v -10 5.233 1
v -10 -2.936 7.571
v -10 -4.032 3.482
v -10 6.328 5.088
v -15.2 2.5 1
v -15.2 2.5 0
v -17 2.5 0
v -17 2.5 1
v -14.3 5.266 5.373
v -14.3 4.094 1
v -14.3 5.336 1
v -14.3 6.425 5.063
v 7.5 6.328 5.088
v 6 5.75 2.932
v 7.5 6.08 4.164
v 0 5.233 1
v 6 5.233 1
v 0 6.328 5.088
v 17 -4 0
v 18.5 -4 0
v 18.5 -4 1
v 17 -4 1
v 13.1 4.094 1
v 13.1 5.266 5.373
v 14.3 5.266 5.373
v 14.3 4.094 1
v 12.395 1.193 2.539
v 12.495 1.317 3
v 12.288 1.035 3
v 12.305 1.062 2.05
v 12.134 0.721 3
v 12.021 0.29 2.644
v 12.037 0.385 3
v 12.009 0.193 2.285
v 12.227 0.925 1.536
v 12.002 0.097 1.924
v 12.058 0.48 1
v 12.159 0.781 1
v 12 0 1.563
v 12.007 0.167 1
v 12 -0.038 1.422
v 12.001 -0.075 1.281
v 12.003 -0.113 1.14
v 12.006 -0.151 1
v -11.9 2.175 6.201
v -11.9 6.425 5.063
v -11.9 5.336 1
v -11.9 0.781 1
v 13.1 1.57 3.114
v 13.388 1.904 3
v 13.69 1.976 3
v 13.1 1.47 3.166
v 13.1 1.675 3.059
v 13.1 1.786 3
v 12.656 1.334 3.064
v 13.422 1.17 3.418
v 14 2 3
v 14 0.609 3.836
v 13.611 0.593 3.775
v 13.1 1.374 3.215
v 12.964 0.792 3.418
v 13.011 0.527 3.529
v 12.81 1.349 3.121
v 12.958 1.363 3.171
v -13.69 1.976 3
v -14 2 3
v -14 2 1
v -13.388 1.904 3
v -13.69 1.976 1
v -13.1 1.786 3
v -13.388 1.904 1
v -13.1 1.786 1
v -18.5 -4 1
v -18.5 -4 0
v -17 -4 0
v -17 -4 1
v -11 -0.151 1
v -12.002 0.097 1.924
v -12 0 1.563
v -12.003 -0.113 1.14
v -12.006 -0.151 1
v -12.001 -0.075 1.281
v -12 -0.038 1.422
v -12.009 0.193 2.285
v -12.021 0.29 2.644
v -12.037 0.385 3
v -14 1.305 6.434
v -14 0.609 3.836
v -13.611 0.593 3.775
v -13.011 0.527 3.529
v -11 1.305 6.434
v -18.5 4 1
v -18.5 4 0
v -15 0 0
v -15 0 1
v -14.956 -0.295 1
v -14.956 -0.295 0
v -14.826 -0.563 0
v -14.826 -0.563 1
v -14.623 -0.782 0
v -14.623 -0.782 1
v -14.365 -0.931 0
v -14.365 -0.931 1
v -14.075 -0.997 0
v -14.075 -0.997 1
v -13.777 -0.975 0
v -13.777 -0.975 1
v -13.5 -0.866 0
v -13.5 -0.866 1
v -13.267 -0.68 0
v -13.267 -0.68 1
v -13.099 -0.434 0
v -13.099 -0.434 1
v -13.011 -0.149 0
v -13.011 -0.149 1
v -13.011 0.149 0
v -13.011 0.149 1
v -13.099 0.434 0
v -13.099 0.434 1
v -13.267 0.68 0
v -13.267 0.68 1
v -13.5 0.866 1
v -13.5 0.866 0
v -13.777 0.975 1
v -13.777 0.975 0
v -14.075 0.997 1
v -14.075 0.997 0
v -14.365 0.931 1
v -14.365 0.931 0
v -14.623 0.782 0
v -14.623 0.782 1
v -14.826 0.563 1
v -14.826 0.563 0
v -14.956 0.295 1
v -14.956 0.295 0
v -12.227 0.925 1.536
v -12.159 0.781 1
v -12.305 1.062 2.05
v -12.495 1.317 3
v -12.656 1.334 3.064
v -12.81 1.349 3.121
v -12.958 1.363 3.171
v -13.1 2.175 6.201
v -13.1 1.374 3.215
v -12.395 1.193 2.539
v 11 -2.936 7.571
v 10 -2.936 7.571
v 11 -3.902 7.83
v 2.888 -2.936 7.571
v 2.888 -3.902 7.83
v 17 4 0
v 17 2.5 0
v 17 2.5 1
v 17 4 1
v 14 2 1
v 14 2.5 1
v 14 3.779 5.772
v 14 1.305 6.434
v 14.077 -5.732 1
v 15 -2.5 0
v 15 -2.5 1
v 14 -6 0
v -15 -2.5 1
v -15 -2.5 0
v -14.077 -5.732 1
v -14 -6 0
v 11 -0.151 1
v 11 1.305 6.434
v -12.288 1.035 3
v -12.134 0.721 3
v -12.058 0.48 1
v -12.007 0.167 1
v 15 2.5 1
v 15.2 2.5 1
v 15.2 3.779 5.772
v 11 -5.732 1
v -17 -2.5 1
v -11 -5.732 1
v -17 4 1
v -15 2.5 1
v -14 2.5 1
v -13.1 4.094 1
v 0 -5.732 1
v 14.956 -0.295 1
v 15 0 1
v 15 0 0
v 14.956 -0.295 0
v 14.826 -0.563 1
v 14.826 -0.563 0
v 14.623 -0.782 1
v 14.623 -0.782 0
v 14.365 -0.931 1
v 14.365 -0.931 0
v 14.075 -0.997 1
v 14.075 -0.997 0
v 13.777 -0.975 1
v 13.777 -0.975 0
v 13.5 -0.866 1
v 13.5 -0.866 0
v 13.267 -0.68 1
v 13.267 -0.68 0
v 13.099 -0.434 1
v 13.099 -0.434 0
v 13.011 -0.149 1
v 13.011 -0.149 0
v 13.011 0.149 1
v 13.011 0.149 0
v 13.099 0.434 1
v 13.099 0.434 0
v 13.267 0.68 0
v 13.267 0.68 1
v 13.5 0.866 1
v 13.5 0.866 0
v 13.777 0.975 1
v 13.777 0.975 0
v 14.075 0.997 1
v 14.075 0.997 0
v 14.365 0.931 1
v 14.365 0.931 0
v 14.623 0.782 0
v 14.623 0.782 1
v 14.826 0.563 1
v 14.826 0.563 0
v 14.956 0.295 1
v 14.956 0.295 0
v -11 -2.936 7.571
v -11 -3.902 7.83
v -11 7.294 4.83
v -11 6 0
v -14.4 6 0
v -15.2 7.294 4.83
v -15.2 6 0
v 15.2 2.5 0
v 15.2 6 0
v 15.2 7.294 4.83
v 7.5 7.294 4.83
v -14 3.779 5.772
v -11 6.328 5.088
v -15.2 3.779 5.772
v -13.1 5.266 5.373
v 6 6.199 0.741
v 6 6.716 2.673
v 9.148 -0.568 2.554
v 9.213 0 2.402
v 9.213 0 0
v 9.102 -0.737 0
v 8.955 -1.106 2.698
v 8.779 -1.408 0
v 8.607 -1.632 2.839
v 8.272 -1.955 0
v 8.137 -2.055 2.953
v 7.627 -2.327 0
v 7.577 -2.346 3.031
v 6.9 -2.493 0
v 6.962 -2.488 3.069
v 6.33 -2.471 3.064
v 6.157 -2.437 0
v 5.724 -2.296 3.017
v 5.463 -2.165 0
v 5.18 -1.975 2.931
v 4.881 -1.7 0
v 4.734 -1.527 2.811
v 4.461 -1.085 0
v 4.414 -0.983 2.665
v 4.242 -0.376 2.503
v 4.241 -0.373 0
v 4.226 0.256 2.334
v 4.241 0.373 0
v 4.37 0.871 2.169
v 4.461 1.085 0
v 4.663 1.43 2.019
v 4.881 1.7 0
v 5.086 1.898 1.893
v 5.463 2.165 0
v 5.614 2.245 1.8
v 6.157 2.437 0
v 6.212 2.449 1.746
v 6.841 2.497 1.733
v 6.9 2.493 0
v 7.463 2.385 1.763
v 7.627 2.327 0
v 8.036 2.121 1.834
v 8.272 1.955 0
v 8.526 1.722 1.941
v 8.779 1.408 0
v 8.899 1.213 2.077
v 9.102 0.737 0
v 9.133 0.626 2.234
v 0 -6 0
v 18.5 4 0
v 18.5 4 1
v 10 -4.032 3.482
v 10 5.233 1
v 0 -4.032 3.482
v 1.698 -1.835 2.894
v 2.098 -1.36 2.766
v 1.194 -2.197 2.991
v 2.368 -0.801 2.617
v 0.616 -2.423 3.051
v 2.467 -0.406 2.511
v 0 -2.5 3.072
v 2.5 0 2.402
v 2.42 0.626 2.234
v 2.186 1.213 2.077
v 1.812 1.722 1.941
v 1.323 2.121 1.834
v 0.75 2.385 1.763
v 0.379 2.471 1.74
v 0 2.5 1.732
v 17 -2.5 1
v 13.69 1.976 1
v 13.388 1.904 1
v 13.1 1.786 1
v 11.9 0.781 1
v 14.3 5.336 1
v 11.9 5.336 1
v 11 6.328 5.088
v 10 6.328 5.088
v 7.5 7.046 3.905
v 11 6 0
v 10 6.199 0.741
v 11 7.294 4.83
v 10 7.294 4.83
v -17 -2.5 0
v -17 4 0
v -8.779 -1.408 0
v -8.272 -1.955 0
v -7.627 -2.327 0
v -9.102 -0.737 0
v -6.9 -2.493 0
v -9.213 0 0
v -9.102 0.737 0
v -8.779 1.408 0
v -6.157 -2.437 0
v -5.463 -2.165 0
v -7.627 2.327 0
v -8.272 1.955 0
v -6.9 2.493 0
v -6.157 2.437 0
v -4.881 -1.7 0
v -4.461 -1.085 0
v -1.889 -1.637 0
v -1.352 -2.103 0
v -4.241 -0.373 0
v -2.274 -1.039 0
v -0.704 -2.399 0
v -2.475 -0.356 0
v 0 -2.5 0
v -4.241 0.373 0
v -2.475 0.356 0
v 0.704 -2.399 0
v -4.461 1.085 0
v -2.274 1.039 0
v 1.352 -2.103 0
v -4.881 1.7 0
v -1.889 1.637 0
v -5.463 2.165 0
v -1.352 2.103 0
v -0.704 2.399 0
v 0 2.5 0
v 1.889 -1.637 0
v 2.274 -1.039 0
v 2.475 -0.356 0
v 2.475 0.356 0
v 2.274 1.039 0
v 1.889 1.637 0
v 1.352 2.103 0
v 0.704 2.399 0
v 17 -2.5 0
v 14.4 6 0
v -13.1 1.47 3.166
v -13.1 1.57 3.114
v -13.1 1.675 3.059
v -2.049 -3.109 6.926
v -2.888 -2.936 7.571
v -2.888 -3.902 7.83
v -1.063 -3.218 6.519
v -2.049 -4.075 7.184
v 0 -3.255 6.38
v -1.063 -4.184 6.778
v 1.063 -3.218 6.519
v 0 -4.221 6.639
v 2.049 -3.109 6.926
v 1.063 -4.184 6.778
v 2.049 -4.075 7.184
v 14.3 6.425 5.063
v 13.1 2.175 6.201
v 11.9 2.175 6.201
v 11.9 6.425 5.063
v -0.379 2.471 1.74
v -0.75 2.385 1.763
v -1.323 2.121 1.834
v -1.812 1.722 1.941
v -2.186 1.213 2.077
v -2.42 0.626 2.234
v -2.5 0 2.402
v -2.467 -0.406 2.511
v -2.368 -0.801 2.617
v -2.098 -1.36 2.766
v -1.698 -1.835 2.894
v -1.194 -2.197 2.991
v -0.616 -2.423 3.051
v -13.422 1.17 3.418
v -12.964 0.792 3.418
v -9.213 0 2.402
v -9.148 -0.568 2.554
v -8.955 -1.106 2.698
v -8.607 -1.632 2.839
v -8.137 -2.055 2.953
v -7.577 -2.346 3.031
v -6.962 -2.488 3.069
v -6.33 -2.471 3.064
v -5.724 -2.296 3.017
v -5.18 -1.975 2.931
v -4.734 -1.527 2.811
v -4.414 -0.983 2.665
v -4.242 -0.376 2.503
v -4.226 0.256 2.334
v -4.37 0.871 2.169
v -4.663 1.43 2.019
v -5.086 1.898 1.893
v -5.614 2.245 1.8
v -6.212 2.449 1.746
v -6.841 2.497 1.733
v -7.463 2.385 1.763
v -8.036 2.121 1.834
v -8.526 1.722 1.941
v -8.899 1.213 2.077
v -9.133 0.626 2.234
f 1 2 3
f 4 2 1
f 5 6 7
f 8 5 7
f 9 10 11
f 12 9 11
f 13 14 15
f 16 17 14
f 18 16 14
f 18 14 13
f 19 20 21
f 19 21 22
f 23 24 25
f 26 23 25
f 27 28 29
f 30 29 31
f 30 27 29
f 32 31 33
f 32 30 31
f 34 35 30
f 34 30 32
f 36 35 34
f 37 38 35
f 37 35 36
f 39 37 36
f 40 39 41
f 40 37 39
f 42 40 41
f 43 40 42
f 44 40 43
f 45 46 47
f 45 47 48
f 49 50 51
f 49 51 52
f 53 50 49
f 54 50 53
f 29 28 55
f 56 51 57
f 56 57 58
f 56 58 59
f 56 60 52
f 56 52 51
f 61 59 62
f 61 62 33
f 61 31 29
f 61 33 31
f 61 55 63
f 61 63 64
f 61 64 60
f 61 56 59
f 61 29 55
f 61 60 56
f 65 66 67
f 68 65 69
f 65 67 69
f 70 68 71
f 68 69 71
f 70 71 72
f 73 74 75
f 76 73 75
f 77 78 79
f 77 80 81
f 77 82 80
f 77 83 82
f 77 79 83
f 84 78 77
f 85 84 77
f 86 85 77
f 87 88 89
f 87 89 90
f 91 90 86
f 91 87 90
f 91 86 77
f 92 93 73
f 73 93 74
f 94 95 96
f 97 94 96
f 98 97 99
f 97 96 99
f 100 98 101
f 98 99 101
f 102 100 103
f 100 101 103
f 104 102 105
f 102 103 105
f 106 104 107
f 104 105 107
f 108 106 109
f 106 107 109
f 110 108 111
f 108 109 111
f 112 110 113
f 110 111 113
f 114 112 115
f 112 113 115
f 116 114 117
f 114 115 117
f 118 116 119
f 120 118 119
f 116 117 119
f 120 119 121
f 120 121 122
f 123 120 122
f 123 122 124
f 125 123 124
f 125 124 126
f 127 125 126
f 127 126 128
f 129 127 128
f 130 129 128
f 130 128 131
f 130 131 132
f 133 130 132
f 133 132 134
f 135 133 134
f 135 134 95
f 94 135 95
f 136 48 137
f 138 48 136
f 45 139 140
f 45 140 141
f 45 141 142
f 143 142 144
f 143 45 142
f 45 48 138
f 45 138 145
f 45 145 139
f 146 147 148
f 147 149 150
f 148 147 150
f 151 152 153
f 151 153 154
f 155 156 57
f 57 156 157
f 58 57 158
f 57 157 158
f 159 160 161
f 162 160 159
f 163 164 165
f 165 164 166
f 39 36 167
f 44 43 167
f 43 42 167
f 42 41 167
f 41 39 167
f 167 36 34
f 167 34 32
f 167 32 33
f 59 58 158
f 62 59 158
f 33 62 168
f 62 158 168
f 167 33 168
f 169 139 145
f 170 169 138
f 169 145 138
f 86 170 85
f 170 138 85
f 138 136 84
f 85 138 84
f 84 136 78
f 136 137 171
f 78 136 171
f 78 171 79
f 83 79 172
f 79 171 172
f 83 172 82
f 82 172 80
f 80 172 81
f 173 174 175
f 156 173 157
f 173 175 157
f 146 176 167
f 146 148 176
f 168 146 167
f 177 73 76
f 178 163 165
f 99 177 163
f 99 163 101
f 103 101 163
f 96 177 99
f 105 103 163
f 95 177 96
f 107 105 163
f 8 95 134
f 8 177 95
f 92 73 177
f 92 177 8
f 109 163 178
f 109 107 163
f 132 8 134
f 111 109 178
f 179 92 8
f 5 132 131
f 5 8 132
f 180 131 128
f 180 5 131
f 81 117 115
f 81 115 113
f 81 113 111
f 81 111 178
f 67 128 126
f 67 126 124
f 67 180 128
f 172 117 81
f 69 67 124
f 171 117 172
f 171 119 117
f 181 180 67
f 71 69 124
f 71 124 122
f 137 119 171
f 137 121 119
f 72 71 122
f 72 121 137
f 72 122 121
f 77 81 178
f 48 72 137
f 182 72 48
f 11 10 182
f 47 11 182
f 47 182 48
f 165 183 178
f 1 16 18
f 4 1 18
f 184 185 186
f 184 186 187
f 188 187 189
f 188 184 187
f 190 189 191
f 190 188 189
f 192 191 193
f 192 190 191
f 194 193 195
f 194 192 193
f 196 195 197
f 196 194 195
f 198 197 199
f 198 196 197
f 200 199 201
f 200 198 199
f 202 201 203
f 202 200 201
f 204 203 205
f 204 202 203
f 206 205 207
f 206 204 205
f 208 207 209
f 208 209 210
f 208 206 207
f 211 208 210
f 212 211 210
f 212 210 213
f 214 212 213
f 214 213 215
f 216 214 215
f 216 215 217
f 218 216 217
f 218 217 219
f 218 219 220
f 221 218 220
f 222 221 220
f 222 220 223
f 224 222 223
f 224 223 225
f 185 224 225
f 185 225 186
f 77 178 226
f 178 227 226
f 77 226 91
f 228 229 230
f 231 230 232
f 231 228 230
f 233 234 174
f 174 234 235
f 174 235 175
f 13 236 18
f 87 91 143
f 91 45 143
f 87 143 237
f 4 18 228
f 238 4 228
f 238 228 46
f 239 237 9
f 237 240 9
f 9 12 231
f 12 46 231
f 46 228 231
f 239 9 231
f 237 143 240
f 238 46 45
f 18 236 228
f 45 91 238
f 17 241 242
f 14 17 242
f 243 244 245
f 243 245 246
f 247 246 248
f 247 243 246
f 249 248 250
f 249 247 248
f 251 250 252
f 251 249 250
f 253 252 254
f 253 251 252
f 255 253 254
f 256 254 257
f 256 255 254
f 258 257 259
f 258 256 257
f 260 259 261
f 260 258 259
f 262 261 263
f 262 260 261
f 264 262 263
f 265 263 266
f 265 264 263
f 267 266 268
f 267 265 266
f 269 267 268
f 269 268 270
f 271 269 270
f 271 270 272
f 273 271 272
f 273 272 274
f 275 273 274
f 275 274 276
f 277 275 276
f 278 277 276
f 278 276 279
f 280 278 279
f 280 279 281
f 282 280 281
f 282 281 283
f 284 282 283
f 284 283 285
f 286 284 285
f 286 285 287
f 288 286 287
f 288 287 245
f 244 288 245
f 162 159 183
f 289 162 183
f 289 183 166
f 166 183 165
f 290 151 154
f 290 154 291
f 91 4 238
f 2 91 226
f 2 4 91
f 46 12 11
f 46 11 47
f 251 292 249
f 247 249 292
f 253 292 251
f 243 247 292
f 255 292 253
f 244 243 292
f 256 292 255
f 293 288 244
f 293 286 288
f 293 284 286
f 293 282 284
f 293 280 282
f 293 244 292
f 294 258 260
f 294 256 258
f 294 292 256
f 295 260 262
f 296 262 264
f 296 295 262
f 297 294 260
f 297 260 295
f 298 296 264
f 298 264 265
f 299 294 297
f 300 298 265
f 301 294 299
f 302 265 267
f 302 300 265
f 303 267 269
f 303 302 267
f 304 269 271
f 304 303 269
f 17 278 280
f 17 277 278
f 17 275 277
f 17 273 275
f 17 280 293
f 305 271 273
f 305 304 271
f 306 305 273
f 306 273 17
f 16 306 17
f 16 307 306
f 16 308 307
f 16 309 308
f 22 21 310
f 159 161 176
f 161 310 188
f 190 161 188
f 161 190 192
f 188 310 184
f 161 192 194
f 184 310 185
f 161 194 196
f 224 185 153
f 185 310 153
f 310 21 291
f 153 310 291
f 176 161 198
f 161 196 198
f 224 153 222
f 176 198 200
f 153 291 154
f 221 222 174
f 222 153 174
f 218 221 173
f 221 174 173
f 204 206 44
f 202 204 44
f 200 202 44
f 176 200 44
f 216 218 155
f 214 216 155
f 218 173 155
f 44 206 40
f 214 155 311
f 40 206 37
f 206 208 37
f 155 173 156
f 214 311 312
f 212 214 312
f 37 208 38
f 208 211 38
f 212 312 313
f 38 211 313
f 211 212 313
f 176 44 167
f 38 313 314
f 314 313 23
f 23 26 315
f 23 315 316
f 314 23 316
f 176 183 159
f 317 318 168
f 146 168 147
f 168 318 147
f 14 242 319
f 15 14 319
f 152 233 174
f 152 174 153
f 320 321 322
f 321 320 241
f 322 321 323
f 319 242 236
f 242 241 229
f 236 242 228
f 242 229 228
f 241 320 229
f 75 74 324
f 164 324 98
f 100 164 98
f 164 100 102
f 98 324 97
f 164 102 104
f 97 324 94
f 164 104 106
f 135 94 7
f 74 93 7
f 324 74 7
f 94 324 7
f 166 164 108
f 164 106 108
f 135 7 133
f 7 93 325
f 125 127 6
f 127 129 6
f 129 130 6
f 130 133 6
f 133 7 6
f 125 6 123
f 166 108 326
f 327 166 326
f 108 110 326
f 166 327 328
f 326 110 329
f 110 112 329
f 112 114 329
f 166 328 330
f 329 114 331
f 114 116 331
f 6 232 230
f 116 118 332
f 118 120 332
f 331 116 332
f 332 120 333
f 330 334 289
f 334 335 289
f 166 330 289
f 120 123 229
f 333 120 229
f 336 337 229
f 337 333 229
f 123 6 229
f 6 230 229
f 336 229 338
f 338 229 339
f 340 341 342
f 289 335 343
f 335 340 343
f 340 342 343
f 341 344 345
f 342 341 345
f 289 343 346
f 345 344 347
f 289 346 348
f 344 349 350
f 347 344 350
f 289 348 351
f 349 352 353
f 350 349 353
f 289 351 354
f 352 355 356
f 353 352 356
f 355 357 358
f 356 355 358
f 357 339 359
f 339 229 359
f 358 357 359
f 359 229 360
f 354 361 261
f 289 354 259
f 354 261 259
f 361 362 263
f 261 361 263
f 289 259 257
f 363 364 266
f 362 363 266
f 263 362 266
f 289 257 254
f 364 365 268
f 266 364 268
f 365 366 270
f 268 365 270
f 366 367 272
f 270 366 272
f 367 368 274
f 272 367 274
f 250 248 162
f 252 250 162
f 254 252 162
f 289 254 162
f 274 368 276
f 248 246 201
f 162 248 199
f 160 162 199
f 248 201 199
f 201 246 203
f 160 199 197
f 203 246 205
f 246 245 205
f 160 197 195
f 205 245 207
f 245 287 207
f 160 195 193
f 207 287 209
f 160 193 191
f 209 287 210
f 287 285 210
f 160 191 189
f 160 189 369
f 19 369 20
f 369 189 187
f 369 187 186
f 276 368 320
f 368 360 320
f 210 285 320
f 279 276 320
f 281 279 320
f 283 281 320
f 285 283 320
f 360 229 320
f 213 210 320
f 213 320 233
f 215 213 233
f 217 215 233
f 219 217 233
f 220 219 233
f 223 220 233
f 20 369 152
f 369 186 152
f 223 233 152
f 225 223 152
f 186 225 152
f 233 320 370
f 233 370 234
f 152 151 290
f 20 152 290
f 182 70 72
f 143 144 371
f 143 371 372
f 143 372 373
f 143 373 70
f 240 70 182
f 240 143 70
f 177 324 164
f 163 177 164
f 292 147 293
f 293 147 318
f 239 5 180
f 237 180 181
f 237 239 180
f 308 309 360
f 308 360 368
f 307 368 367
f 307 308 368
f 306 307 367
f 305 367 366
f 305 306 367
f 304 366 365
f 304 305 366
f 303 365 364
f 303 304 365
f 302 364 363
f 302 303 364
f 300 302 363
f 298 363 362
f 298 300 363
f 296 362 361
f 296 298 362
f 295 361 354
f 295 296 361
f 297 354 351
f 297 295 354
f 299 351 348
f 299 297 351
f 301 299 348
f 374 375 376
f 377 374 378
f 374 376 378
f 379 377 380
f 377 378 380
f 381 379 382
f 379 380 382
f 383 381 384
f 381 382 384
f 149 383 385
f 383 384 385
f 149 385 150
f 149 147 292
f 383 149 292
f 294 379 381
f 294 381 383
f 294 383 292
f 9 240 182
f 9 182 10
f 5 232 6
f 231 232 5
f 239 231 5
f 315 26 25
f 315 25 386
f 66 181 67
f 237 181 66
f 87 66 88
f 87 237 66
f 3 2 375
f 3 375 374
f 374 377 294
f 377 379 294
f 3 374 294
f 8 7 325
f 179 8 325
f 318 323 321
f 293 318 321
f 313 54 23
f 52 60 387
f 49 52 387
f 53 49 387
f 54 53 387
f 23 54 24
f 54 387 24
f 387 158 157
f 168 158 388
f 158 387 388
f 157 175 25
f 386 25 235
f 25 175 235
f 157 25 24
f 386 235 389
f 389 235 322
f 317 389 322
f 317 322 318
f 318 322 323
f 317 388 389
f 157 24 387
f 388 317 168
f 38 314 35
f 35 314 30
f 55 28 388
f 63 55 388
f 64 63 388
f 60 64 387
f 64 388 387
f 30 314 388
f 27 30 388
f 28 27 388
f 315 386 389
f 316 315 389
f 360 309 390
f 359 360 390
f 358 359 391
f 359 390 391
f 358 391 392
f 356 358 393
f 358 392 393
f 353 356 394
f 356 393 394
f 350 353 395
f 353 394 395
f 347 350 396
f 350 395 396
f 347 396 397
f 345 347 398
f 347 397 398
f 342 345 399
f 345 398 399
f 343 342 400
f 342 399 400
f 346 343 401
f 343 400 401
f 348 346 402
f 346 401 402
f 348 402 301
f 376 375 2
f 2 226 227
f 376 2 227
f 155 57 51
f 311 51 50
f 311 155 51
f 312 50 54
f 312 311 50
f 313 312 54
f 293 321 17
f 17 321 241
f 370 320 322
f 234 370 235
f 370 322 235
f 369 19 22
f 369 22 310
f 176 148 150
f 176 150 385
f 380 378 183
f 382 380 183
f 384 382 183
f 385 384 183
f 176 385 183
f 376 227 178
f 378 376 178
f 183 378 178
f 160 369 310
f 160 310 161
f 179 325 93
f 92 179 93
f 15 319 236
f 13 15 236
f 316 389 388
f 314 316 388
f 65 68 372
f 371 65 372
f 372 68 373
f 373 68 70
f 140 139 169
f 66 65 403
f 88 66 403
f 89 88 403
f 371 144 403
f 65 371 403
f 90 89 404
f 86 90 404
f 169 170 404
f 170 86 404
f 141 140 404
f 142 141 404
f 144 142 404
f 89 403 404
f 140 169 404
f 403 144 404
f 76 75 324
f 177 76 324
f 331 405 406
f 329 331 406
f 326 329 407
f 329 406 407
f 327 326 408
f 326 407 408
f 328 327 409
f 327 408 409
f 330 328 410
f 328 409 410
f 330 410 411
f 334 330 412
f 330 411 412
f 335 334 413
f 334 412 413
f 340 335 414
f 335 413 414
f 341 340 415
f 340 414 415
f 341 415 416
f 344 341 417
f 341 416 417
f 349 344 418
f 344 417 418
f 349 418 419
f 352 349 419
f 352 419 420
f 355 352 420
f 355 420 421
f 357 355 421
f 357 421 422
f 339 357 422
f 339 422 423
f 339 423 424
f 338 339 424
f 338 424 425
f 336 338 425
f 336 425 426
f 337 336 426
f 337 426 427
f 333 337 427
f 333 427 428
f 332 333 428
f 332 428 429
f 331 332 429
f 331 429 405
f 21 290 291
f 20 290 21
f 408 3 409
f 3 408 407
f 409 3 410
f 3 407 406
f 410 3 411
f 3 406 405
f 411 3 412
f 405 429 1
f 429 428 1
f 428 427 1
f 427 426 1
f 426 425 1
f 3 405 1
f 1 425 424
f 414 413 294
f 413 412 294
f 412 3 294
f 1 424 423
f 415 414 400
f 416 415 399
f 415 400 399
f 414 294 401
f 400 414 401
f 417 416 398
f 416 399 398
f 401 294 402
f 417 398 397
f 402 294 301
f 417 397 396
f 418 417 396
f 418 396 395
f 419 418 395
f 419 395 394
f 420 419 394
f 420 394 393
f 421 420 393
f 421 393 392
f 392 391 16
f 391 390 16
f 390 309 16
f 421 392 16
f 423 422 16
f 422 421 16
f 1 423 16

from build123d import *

# Parameters (mm, degrees)
F1_DEPTH  = 1
F3_DEPTH  = 11
F4_DEPTH  = 10
F5_W      = 1.2
F5_H      = 0.6395594371
F6_REACH  = 15.595486632
F7_SIZE2  = 0.267939
F7_SIZE   = 0.99999
F8_D      = 2
F8_DEPTH  = 2
F8_TIP    = 0.600860619
F10_D     = 5
F10_DEPTH = 5
F10_TIP   = 1.5021515476
F11_D     = 4
F11_DEPTH = 2
F11_TIP   = 1.2017212381
F14_DEPTH = 1
F16_DEPTH = 1


# Not quite as in the source:
# - a fillet or chamfer is up to 0.001 mm smaller than in the source, because OpenCascade refuses the exact size
# - a feature names something its author has since deleted; it is built from what else it names


with BuildPart() as f1:
    # F0 (on Top) → F1 (new body)
    with BuildSketch(Plane.XY):
        Polygon((-18.5, 4), (-18.5, 0), (-18.5, -4), (-17, -4), (-17, -2.5), (-15, -2.5), (-14, -6), (0, -6), (0, 6), (-10.2, 6), (-10.2, -0.1), (-13.1, -0.1), (-13.1, 3.1), (-14.4, 3.1), (-14.4, 6), (-15, 2.5), (-17, 2.5), (-17, 4), align=None)
        Polygon((-10.2, 6), (-14.4, 6), (-14.4, 3.1), (-13.1, 3.1), (-13.1, -0.1), (-10.2, -0.1), align=None)
        Polygon((-11, 5.2), (-11, 0.7), (-12.3, 0.7), (-12.3, 3.9), (-13.6, 3.9), (-13.6, 5.2), align=None, mode=Mode.SUBTRACT)
        Polygon((-12.3, 0.7), (-11, 0.7), (-11, 5.2), (-13.6, 5.2), (-13.6, 3.9), (-12.3, 3.9), align=None)
    extrude(amount=F1_DEPTH)

    # F2 (on Right) → F3 (join)
    with BuildSketch(Plane.YZ):
        Polygon((-6, 0), (-4.9647238196, 0), (-4.0316277581, 3.4823619098), (-2.9361313709, 7.5708100863), (-3.9020571972, 7.8296291314), align=None)
        Polygon((4.9647238196, 0), (6, 0), (7.2940952255, 4.8296291314), (6.3281693992, 5.0884481765), (5.232673012, 1), align=None)
        Polygon((-4.9647238196, 0), (4.9647238196, 0), (5.232673012, 1), (-4.0316277581, 3.4823619098), align=None)
        Polygon((-4.0316277581, 3.4823619098), (5.232673012, 1), (6.3281693992, 5.0884481765), (-2.9361313709, 7.5708100863), align=None)
    extrude(amount=-F3_DEPTH)

    # F2 (on Right) → F4 (cut)
    with BuildSketch(Plane.YZ):
        Polygon((-4.0316277581, 3.4823619098), (5.232673012, 1), (6.3281693992, 5.0884481765), (-2.9361313709, 7.5708100863), align=None)
    extrude(amount=-F4_DEPTH, mode=Mode.SUBTRACT)

    f6_end = Plane(origin=(-8.4427376171, 0.0169846051, 0), x_dir=(-1, 0, 0), z_dir=(0, 0, -1))
    # F5 (on face) → F6 (join, up to a plane its end follows)
    with BuildSketch(Plane(origin=(0, 1.6960190142, 6.3296291314), x_dir=(1, 0, 0), z_dir=(0, 0.2588190451, 0.9659258263))):
        Polygon((-15.2, 5.7955549577), (-15.2, 2.7955549577), (-14, 2.7955549577), (-14, 2.1559955206), (-14, -0.4044450423), (-11, -0.4044450423), (-11, 5.7955549577), align=None)
        Polygon((-11.9, 4.8955549577), (-11.9, 0.4955549577), (-13.1, 0.4955549577), (-13.1, 3.6955549577), (-14.3, 3.6955549577), (-14.3, 4.8955549577), align=None, mode=Mode.SUBTRACT)
        with Locations((-14.6, 2.4757752392)):
            Rectangle(F5_W, F5_H)
    f6_long = extrude(amount=-F6_REACH, mode=Mode.PRIVATE)
    add(split(f6_long, bisect_by=f6_end, keep=Keep.BOTTOM, mode=Mode.PRIVATE))

    # F7 (size 1 and 0.2679491924 in the source; OpenCascade refuses exactly that, so slightly less here)
    f7_edges = [f1.edges().sort_by_distance(p)[0] for p in [
        (-7, -6, 1),
    ]]
    f7_side = f1.faces().sort_by_distance((-7, -6, 0.5))[0]
    chamfer(f7_edges, length=F7_SIZE, length2=F7_SIZE2, reference=f7_side)

    # F8
    with Locations(Plane(origin=(0, 0, 0), x_dir=(1, 0, 0), z_dir=(0, 0, -1))):
        with Locations((-14, 0)):
            Hole(F8_D / 2, depth=F8_DEPTH)
            with Locations((0, 0, -(F8_DEPTH + F8_TIP / 2))):  # 118° drill point
                Cone(0, F8_D / 2, F8_TIP, mode=Mode.SUBTRACT)

    # F10
    with Locations(Plane(origin=(0, 0, 0), x_dir=(1, 0, 0), z_dir=(0, 0, -1))):
        with Locations((-6.7131645046, 0), (0, 0)):
            Hole(F10_D / 2, depth=F10_DEPTH)
            with Locations((0, 0, -(F10_DEPTH + F10_TIP / 2))):  # 118° drill point
                Cone(0, F10_D / 2, F10_TIP, mode=Mode.SUBTRACT)

    # F11 (one way)
    with BuildSketch(Plane(origin=(0, 0, 1), x_dir=(1, 0, 0), z_dir=(0, 0, -1))):
        with Locations((-14, 0)):
            Circle(F11_D / 2)
    extrude(amount=-F11_DEPTH, mode=Mode.SUBTRACT)
    with Locations(Plane(origin=(0, 0, 1), x_dir=(1, 0, 0), z_dir=(0, 0, -1))):
        with Locations((-14, 0)):
            with Locations((0, 0, -(F11_DEPTH + F11_TIP / 2))):  # 118° drill point
                Cone(0, F11_D / 2, F11_TIP, mode=Mode.SUBTRACT)

    # F12: F1 across plane


with BuildPart() as f1_1:
    add(f1.part)
    add(f1.part.mirror(Plane.YZ))

    # F13 (on face) → F14 (cut)
    with BuildSketch(Plane(origin=(0, -5.5980762114, 1.5), x_dir=(1, 0, 0), z_dir=(0, -0.9659258263, 0.2588190451))):
        with BuildLine():
            Line((0, 6.5529142706), (-2.8882349873, 6.5529142706))
            ThreePointArc((-2.8882349873, 6.5529142706), (0, 5.3202412586), (2.8882349873, 6.5529142706))
            Line((2.8882349873, 6.5529142706), (0, 6.5529142706))
        make_face()
    extrude(amount=-F14_DEPTH, mode=Mode.SUBTRACT)

    # F15 (on face) → F16 (cut, through all)
    with BuildSketch(Plane(origin=(0, 5.5980762114, -1.5), x_dir=(-1, 0, 0), z_dir=(0, 0.9659258263, -0.2588190451))):
        Polygon((-7.5, 6.5529142706), (-10, 6.5529142706), (-10, 2.3202412586), (-6, 2.3202412586), (-6, 4.3202412586), (-7.5, 5.5958246812), align=None)
    extrude(amount=-F16_DEPTH, mode=Mode.SUBTRACT)


solid = f1_1.part
